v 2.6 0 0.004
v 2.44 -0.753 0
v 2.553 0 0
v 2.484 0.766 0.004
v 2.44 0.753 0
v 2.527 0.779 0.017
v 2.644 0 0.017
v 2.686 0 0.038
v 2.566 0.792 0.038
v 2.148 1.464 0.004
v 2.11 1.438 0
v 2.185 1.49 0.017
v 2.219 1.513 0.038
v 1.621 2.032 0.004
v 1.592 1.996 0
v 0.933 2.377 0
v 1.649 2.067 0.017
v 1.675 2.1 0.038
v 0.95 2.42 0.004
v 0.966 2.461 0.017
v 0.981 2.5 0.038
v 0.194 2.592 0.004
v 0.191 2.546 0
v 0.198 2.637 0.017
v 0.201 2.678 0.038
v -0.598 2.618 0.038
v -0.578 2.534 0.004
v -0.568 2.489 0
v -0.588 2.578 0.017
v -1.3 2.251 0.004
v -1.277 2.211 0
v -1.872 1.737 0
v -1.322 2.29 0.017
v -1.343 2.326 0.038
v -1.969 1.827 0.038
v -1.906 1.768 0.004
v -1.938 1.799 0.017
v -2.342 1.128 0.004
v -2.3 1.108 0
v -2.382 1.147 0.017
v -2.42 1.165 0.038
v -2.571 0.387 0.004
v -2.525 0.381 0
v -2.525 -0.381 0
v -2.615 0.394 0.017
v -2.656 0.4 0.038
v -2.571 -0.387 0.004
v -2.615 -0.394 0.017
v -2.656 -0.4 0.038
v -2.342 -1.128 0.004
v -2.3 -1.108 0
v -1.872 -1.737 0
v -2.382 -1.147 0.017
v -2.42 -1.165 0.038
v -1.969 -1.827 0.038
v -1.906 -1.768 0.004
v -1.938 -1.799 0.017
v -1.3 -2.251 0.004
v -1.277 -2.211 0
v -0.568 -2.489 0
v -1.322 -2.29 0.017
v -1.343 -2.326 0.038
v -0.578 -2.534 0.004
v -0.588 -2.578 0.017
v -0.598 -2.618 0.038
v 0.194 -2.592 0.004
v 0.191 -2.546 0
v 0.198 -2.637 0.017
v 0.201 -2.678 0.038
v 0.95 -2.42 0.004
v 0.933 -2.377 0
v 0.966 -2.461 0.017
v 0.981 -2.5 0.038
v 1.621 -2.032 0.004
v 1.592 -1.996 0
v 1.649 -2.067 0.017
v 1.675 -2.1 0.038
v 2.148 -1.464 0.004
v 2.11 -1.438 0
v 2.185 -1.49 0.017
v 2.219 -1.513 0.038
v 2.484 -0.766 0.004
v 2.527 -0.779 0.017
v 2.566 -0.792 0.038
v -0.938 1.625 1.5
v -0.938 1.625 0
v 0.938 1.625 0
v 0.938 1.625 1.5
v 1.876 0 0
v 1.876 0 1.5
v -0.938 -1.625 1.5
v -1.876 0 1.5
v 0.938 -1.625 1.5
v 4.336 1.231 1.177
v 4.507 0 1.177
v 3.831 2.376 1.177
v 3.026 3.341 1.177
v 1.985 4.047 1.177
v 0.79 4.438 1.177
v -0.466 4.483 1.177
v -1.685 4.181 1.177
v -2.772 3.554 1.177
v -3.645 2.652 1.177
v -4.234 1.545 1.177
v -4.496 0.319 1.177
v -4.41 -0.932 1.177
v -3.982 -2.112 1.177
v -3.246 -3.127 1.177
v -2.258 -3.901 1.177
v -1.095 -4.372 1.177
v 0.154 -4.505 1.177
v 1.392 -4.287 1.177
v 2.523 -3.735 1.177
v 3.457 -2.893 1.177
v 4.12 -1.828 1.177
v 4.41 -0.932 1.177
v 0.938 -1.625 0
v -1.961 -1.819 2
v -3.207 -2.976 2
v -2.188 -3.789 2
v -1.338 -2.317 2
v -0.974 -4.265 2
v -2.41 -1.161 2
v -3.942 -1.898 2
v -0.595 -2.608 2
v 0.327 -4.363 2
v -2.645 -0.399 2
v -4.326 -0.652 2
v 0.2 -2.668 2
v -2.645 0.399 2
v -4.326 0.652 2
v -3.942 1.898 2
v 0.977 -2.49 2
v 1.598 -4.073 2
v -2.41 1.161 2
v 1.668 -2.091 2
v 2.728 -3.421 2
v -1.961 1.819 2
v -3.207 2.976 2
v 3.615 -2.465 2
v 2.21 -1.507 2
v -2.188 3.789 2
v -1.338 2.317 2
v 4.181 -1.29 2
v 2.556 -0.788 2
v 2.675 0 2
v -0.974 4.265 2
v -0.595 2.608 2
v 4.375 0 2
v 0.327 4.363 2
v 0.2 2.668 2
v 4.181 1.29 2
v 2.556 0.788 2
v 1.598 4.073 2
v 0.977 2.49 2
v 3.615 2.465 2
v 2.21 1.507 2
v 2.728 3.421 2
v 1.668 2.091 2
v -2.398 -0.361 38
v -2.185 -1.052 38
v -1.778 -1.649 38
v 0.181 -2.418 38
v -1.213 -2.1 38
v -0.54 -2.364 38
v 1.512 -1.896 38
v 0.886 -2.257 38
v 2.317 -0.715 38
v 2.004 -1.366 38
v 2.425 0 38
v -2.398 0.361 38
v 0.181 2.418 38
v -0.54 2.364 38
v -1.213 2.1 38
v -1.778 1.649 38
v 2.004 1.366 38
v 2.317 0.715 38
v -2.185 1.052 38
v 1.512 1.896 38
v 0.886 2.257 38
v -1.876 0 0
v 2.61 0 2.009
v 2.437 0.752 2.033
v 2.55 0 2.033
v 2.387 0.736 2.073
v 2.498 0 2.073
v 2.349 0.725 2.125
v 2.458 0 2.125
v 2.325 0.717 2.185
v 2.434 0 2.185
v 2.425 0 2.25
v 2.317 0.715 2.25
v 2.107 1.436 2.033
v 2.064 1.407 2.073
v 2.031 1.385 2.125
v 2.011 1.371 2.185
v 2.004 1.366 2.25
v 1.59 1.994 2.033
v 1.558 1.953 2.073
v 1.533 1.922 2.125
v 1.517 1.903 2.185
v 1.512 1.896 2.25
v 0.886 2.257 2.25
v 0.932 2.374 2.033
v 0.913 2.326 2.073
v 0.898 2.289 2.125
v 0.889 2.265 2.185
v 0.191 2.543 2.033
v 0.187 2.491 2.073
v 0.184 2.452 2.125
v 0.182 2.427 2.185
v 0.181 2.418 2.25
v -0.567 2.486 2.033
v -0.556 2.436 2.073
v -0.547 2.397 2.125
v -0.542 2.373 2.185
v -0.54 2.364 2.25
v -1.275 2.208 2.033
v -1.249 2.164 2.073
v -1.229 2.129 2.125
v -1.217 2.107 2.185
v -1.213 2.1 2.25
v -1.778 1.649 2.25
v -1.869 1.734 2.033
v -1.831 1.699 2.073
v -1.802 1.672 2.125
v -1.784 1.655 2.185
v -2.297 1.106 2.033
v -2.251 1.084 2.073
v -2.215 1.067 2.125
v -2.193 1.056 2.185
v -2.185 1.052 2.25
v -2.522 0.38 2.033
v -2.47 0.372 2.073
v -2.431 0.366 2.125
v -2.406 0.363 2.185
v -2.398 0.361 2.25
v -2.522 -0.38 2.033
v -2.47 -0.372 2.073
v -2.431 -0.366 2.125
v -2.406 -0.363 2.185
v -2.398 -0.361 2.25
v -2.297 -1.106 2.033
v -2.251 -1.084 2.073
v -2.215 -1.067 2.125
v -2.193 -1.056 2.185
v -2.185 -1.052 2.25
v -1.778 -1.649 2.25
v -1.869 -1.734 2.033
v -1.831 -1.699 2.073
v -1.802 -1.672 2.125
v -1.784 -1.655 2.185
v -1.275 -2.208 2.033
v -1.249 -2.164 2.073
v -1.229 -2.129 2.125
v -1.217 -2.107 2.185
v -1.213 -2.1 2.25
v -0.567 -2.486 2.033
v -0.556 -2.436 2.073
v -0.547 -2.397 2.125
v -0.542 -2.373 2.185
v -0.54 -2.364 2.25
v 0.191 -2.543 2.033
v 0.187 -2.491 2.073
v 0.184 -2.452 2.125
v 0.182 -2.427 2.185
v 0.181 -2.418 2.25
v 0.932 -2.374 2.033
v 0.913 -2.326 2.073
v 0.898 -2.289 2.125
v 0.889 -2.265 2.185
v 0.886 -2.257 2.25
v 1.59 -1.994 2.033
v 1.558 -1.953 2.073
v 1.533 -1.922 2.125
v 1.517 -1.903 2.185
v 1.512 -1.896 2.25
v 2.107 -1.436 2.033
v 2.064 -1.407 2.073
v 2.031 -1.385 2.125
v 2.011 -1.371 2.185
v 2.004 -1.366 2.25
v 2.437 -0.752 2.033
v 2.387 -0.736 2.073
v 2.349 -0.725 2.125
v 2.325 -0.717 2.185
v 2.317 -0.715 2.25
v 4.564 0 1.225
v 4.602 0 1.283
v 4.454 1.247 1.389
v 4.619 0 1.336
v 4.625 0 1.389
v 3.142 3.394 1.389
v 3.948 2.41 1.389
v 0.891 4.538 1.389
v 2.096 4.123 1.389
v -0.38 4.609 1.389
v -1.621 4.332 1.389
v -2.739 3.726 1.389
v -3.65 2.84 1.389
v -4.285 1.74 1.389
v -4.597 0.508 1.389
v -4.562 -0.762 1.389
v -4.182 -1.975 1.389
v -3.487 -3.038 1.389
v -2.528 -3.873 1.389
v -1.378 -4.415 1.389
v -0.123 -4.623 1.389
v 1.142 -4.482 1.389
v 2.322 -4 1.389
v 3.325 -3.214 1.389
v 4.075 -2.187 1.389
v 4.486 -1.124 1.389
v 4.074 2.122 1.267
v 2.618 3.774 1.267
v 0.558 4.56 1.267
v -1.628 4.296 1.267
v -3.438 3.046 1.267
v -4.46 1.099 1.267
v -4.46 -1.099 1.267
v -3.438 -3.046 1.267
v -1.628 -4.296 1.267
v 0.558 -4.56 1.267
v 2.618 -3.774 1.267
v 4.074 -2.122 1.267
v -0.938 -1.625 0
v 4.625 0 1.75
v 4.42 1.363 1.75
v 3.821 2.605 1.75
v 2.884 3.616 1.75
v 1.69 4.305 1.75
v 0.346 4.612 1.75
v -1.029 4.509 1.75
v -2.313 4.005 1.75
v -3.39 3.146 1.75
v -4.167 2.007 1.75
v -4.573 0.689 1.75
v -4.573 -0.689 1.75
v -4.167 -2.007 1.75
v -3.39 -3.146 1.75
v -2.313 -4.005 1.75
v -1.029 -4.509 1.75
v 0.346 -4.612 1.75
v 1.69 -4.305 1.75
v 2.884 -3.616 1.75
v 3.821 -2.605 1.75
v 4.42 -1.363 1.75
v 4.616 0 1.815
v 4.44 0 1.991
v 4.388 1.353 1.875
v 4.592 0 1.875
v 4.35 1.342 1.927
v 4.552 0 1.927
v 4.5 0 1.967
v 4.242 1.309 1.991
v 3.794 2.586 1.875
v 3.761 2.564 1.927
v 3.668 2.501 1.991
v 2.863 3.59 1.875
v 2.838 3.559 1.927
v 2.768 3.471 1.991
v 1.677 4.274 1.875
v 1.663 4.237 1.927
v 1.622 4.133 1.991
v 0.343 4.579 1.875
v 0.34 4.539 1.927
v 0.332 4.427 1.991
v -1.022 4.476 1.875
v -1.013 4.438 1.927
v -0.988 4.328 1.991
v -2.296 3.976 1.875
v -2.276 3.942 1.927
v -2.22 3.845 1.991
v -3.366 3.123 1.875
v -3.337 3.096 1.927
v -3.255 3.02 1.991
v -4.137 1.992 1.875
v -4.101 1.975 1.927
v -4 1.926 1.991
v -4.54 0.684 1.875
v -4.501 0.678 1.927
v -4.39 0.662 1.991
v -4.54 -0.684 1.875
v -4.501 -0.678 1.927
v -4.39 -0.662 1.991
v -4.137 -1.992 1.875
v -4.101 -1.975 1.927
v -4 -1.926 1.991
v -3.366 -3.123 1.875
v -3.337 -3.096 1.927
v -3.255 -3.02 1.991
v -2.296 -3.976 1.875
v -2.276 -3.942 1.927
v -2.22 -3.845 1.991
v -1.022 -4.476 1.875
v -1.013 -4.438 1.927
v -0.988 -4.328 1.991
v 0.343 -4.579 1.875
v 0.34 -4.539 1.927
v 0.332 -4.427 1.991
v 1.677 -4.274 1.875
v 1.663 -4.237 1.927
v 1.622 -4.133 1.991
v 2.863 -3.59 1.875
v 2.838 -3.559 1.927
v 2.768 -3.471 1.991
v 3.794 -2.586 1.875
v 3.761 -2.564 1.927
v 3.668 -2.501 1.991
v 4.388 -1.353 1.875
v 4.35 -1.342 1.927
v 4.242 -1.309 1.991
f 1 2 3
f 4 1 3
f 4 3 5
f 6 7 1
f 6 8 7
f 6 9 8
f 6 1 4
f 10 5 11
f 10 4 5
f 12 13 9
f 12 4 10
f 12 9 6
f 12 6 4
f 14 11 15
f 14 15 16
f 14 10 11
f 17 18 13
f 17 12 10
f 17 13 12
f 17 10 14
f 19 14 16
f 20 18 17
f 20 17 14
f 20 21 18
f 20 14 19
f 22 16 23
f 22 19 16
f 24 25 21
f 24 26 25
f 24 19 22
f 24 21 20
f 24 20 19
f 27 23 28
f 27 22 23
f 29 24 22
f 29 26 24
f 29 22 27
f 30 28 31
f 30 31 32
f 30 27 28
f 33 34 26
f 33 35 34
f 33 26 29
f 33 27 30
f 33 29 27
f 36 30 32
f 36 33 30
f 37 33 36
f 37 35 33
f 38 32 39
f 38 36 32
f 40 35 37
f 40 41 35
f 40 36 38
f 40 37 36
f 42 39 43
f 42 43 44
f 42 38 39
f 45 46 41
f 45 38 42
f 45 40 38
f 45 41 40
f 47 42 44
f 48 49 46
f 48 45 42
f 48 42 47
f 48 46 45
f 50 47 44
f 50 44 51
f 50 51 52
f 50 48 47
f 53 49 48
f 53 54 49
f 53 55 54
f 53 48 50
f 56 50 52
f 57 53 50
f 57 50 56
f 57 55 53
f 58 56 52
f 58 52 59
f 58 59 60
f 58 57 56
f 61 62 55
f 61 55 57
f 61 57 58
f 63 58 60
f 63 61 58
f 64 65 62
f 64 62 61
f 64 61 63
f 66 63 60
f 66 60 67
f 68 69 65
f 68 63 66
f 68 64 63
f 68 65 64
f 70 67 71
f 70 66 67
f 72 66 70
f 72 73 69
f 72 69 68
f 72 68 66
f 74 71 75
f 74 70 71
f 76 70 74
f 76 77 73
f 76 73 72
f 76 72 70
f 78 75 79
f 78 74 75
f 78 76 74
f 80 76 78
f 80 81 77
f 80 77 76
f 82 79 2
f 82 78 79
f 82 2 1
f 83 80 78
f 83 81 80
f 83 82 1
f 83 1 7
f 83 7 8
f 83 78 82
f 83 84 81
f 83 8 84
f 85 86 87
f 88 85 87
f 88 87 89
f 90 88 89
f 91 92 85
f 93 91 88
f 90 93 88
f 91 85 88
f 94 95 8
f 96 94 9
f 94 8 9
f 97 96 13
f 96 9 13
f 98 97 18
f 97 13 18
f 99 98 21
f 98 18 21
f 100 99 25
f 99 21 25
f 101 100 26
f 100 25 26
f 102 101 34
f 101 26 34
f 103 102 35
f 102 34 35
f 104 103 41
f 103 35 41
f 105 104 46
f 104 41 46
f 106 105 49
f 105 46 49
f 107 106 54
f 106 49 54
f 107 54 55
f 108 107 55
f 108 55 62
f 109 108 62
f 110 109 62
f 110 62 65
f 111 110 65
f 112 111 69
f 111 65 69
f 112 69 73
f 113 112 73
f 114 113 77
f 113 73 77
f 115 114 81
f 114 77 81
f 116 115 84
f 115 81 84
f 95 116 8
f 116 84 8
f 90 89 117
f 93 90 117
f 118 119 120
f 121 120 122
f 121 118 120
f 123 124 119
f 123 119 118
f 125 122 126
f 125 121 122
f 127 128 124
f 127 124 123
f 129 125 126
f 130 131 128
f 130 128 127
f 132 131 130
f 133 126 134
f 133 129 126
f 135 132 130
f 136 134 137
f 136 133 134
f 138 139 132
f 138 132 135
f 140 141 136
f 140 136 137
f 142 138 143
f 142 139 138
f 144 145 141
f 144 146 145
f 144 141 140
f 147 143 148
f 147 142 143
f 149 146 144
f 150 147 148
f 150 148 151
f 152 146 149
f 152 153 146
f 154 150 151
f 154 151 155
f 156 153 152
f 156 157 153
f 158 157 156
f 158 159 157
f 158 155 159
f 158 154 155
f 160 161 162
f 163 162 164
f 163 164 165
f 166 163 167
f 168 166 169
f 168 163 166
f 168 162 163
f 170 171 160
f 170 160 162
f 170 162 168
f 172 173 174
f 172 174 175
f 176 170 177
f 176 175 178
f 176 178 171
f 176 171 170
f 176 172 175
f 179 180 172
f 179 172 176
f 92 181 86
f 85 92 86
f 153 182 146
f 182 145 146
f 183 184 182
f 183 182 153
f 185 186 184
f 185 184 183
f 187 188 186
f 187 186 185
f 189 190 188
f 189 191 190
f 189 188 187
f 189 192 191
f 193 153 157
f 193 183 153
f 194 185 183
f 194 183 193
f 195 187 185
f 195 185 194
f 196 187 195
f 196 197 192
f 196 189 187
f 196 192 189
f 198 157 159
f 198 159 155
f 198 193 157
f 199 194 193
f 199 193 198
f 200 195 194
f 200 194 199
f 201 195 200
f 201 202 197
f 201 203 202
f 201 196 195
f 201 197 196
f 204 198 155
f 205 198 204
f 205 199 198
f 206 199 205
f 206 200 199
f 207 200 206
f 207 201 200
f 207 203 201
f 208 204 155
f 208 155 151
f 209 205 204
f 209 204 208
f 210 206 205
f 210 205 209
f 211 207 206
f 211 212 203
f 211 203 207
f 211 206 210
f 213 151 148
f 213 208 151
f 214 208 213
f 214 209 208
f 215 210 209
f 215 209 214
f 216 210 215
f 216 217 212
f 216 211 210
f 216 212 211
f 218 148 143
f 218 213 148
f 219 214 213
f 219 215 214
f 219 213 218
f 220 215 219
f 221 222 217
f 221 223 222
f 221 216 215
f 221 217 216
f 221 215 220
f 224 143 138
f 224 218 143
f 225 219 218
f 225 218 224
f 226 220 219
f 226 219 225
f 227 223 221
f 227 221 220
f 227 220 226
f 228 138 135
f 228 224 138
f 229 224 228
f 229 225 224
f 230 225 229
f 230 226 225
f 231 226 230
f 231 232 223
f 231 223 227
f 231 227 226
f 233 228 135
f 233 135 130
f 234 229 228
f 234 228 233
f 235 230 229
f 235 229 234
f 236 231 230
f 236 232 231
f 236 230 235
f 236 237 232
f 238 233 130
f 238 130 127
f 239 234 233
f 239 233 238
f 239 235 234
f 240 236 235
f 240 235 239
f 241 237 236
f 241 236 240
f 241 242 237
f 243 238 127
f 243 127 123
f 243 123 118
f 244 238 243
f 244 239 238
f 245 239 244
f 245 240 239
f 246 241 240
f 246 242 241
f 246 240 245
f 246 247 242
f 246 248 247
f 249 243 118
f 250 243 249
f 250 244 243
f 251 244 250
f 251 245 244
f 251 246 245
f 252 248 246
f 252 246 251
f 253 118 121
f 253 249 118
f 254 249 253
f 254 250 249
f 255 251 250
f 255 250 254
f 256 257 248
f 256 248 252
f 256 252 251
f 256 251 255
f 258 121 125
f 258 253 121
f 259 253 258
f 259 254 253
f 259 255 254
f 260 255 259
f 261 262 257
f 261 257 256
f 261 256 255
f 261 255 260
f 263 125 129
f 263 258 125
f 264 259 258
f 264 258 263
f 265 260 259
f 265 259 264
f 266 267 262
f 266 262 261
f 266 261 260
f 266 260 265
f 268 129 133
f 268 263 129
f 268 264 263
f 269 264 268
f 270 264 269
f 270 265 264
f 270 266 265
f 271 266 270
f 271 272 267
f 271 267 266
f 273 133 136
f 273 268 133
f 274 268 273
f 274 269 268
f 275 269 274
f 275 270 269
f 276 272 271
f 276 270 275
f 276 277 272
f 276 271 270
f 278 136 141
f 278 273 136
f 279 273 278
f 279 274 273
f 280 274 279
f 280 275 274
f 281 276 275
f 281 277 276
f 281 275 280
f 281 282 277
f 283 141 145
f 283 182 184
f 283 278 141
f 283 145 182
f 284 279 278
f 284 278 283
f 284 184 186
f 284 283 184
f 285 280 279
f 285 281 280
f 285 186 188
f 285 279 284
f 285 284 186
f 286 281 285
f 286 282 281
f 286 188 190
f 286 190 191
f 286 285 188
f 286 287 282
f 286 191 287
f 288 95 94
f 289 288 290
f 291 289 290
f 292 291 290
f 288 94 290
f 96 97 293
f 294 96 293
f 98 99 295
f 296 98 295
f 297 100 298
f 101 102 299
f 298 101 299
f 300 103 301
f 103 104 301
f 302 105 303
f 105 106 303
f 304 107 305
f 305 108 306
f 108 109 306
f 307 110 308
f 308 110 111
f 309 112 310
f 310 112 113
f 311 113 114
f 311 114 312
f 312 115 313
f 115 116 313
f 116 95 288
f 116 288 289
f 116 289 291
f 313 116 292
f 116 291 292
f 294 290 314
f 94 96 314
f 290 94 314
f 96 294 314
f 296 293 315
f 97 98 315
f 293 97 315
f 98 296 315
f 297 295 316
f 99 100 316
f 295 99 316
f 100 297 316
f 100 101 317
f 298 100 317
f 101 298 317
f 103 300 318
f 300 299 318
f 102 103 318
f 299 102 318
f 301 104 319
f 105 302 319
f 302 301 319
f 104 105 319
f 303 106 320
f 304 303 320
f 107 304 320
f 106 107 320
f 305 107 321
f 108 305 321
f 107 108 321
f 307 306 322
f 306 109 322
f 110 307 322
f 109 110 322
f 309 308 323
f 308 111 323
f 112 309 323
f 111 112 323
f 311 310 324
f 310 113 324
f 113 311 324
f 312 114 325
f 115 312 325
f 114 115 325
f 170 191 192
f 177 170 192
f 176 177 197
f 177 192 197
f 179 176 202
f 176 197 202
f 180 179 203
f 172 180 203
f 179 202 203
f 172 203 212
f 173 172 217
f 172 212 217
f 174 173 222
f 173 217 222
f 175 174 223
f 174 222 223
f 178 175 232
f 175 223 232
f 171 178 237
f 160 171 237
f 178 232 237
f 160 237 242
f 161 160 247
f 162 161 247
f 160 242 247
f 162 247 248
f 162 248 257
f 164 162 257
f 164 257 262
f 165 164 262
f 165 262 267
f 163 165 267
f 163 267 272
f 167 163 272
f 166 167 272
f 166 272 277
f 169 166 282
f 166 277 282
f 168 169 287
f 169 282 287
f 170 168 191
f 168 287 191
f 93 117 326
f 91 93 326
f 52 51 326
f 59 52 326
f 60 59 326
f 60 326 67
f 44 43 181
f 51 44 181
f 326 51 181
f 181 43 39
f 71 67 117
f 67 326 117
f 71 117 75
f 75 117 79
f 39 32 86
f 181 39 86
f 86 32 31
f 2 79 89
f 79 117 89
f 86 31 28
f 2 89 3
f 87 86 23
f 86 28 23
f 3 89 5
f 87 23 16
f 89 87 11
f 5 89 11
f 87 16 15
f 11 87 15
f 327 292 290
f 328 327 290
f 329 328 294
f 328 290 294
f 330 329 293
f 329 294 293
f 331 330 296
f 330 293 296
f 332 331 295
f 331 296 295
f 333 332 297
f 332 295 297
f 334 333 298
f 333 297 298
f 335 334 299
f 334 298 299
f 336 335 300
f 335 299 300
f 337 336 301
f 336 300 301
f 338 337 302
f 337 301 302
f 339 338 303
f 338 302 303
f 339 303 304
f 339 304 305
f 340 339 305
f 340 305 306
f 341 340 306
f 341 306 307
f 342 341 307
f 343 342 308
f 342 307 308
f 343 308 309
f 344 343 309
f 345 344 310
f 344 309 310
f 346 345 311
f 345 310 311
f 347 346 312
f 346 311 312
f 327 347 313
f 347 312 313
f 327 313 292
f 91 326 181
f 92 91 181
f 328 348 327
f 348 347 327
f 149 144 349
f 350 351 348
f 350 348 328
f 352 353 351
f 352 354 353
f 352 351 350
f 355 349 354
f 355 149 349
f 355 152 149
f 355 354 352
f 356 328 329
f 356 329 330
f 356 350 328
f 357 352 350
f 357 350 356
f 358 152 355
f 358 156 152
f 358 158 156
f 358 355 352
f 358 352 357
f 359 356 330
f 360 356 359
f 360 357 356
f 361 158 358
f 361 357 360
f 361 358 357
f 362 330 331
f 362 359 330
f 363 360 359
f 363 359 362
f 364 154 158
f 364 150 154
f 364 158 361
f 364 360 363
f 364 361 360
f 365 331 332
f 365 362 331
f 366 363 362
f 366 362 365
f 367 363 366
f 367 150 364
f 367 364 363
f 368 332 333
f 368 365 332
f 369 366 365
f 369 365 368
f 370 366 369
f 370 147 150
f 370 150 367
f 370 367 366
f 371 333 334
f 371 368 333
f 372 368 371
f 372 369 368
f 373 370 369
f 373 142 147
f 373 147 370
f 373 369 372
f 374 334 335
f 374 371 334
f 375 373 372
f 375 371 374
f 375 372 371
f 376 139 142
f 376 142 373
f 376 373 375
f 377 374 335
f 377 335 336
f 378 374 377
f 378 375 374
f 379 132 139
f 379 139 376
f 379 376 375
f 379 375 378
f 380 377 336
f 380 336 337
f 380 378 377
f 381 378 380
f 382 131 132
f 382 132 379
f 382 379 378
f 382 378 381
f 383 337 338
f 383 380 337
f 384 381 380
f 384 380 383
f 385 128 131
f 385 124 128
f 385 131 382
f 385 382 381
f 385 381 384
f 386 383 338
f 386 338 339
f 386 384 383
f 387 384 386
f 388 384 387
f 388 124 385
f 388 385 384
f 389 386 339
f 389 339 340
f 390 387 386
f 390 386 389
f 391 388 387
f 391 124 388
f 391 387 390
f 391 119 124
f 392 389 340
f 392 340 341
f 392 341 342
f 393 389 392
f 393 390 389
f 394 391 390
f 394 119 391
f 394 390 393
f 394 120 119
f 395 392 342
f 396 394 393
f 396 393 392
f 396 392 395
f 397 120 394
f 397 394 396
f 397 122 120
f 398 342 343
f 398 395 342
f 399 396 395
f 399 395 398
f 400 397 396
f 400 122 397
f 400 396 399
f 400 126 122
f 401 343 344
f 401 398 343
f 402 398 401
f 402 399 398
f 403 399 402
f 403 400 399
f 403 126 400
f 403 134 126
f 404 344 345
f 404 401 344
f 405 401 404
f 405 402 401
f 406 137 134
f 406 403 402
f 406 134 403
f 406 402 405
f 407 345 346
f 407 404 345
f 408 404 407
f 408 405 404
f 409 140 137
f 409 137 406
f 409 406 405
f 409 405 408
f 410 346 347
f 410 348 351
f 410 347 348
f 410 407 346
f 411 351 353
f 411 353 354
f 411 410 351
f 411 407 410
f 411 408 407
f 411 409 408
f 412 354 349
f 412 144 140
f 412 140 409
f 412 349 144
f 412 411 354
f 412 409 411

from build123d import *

# Parameters (mm, degrees)
F1_R     = 4.625
F1_R_2   = 2.425
F2_DEPTH = 2
F3_START = 1.5
F3_DEPTH = 0.5
F4_START = 2
F4_DEPTH = 36
F5_SIZE2 = 2
F5_SIZE  = 1.25
F6_R     = 0.25


# Not quite as in the source:
# - a feature names something its author has since deleted; it is built from what else it names


with BuildPart() as f2:
    # F1 (on Top) → F2 (new body)
    with BuildSketch(Plane.XY):
        Circle(F1_R)
        Circle(F1_R_2, mode=Mode.SUBTRACT)
        Circle(F1_R_2)
        Polygon((-0.9381941874, -1.625), (-1.8763883749, 0), (-0.9381941874, 1.625), (0.9381941874, 1.625), (1.8763883749, 0), (0.9381941874, -1.625), align=None, mode=Mode.SUBTRACT)
    extrude(amount=F2_DEPTH)

    # F1 (on Top) → F3 (join)
    with BuildSketch(Plane.XY.offset(F3_START)):
        Polygon((-0.9381941874, 1.625), (-1.8763883749, 0), (-0.9381941874, -1.625), (0.9381941874, -1.625), (1.8763883749, 0), (0.9381941874, 1.625), align=None)
    extrude(amount=F3_DEPTH)

    # F1 (on Top) → F4 (join)
    with BuildSketch(Plane.XY.offset(F4_START)):
        Circle(F1_R_2)
        Polygon((-0.9381941874, -1.625), (-1.8763883749, 0), (-0.9381941874, 1.625), (0.9381941874, 1.625), (1.8763883749, 0), (0.9381941874, -1.625), align=None, mode=Mode.SUBTRACT)
        Polygon((-0.9381941874, 1.625), (-1.8763883749, 0), (-0.9381941874, -1.625), (0.9381941874, -1.625), (1.8763883749, 0), (0.9381941874, 1.625), align=None)
    extrude(amount=F4_DEPTH)

    # F5
    f5_edges = [f2.edges().sort_by_distance(p)[0] for p in [
        (-4.625, 0, 0),
    ]]
    f5_side = f2.faces().sort_by_distance((-4.625, 0, 1))[0]
    chamfer(f5_edges, length=F5_SIZE, length2=F5_SIZE2, reference=f5_side)

    # F6
    f6_edges = [f2.edges().sort_by_distance(p)[0] for p in [
        (-4.625, 0, 2),
        (-2.425, 0, 2),
        (-2.625, 0, 0),
        (-4.625, 0, 1.25),
    ]]
    fillet(f6_edges, radius=F6_R)


solid = f2.part
